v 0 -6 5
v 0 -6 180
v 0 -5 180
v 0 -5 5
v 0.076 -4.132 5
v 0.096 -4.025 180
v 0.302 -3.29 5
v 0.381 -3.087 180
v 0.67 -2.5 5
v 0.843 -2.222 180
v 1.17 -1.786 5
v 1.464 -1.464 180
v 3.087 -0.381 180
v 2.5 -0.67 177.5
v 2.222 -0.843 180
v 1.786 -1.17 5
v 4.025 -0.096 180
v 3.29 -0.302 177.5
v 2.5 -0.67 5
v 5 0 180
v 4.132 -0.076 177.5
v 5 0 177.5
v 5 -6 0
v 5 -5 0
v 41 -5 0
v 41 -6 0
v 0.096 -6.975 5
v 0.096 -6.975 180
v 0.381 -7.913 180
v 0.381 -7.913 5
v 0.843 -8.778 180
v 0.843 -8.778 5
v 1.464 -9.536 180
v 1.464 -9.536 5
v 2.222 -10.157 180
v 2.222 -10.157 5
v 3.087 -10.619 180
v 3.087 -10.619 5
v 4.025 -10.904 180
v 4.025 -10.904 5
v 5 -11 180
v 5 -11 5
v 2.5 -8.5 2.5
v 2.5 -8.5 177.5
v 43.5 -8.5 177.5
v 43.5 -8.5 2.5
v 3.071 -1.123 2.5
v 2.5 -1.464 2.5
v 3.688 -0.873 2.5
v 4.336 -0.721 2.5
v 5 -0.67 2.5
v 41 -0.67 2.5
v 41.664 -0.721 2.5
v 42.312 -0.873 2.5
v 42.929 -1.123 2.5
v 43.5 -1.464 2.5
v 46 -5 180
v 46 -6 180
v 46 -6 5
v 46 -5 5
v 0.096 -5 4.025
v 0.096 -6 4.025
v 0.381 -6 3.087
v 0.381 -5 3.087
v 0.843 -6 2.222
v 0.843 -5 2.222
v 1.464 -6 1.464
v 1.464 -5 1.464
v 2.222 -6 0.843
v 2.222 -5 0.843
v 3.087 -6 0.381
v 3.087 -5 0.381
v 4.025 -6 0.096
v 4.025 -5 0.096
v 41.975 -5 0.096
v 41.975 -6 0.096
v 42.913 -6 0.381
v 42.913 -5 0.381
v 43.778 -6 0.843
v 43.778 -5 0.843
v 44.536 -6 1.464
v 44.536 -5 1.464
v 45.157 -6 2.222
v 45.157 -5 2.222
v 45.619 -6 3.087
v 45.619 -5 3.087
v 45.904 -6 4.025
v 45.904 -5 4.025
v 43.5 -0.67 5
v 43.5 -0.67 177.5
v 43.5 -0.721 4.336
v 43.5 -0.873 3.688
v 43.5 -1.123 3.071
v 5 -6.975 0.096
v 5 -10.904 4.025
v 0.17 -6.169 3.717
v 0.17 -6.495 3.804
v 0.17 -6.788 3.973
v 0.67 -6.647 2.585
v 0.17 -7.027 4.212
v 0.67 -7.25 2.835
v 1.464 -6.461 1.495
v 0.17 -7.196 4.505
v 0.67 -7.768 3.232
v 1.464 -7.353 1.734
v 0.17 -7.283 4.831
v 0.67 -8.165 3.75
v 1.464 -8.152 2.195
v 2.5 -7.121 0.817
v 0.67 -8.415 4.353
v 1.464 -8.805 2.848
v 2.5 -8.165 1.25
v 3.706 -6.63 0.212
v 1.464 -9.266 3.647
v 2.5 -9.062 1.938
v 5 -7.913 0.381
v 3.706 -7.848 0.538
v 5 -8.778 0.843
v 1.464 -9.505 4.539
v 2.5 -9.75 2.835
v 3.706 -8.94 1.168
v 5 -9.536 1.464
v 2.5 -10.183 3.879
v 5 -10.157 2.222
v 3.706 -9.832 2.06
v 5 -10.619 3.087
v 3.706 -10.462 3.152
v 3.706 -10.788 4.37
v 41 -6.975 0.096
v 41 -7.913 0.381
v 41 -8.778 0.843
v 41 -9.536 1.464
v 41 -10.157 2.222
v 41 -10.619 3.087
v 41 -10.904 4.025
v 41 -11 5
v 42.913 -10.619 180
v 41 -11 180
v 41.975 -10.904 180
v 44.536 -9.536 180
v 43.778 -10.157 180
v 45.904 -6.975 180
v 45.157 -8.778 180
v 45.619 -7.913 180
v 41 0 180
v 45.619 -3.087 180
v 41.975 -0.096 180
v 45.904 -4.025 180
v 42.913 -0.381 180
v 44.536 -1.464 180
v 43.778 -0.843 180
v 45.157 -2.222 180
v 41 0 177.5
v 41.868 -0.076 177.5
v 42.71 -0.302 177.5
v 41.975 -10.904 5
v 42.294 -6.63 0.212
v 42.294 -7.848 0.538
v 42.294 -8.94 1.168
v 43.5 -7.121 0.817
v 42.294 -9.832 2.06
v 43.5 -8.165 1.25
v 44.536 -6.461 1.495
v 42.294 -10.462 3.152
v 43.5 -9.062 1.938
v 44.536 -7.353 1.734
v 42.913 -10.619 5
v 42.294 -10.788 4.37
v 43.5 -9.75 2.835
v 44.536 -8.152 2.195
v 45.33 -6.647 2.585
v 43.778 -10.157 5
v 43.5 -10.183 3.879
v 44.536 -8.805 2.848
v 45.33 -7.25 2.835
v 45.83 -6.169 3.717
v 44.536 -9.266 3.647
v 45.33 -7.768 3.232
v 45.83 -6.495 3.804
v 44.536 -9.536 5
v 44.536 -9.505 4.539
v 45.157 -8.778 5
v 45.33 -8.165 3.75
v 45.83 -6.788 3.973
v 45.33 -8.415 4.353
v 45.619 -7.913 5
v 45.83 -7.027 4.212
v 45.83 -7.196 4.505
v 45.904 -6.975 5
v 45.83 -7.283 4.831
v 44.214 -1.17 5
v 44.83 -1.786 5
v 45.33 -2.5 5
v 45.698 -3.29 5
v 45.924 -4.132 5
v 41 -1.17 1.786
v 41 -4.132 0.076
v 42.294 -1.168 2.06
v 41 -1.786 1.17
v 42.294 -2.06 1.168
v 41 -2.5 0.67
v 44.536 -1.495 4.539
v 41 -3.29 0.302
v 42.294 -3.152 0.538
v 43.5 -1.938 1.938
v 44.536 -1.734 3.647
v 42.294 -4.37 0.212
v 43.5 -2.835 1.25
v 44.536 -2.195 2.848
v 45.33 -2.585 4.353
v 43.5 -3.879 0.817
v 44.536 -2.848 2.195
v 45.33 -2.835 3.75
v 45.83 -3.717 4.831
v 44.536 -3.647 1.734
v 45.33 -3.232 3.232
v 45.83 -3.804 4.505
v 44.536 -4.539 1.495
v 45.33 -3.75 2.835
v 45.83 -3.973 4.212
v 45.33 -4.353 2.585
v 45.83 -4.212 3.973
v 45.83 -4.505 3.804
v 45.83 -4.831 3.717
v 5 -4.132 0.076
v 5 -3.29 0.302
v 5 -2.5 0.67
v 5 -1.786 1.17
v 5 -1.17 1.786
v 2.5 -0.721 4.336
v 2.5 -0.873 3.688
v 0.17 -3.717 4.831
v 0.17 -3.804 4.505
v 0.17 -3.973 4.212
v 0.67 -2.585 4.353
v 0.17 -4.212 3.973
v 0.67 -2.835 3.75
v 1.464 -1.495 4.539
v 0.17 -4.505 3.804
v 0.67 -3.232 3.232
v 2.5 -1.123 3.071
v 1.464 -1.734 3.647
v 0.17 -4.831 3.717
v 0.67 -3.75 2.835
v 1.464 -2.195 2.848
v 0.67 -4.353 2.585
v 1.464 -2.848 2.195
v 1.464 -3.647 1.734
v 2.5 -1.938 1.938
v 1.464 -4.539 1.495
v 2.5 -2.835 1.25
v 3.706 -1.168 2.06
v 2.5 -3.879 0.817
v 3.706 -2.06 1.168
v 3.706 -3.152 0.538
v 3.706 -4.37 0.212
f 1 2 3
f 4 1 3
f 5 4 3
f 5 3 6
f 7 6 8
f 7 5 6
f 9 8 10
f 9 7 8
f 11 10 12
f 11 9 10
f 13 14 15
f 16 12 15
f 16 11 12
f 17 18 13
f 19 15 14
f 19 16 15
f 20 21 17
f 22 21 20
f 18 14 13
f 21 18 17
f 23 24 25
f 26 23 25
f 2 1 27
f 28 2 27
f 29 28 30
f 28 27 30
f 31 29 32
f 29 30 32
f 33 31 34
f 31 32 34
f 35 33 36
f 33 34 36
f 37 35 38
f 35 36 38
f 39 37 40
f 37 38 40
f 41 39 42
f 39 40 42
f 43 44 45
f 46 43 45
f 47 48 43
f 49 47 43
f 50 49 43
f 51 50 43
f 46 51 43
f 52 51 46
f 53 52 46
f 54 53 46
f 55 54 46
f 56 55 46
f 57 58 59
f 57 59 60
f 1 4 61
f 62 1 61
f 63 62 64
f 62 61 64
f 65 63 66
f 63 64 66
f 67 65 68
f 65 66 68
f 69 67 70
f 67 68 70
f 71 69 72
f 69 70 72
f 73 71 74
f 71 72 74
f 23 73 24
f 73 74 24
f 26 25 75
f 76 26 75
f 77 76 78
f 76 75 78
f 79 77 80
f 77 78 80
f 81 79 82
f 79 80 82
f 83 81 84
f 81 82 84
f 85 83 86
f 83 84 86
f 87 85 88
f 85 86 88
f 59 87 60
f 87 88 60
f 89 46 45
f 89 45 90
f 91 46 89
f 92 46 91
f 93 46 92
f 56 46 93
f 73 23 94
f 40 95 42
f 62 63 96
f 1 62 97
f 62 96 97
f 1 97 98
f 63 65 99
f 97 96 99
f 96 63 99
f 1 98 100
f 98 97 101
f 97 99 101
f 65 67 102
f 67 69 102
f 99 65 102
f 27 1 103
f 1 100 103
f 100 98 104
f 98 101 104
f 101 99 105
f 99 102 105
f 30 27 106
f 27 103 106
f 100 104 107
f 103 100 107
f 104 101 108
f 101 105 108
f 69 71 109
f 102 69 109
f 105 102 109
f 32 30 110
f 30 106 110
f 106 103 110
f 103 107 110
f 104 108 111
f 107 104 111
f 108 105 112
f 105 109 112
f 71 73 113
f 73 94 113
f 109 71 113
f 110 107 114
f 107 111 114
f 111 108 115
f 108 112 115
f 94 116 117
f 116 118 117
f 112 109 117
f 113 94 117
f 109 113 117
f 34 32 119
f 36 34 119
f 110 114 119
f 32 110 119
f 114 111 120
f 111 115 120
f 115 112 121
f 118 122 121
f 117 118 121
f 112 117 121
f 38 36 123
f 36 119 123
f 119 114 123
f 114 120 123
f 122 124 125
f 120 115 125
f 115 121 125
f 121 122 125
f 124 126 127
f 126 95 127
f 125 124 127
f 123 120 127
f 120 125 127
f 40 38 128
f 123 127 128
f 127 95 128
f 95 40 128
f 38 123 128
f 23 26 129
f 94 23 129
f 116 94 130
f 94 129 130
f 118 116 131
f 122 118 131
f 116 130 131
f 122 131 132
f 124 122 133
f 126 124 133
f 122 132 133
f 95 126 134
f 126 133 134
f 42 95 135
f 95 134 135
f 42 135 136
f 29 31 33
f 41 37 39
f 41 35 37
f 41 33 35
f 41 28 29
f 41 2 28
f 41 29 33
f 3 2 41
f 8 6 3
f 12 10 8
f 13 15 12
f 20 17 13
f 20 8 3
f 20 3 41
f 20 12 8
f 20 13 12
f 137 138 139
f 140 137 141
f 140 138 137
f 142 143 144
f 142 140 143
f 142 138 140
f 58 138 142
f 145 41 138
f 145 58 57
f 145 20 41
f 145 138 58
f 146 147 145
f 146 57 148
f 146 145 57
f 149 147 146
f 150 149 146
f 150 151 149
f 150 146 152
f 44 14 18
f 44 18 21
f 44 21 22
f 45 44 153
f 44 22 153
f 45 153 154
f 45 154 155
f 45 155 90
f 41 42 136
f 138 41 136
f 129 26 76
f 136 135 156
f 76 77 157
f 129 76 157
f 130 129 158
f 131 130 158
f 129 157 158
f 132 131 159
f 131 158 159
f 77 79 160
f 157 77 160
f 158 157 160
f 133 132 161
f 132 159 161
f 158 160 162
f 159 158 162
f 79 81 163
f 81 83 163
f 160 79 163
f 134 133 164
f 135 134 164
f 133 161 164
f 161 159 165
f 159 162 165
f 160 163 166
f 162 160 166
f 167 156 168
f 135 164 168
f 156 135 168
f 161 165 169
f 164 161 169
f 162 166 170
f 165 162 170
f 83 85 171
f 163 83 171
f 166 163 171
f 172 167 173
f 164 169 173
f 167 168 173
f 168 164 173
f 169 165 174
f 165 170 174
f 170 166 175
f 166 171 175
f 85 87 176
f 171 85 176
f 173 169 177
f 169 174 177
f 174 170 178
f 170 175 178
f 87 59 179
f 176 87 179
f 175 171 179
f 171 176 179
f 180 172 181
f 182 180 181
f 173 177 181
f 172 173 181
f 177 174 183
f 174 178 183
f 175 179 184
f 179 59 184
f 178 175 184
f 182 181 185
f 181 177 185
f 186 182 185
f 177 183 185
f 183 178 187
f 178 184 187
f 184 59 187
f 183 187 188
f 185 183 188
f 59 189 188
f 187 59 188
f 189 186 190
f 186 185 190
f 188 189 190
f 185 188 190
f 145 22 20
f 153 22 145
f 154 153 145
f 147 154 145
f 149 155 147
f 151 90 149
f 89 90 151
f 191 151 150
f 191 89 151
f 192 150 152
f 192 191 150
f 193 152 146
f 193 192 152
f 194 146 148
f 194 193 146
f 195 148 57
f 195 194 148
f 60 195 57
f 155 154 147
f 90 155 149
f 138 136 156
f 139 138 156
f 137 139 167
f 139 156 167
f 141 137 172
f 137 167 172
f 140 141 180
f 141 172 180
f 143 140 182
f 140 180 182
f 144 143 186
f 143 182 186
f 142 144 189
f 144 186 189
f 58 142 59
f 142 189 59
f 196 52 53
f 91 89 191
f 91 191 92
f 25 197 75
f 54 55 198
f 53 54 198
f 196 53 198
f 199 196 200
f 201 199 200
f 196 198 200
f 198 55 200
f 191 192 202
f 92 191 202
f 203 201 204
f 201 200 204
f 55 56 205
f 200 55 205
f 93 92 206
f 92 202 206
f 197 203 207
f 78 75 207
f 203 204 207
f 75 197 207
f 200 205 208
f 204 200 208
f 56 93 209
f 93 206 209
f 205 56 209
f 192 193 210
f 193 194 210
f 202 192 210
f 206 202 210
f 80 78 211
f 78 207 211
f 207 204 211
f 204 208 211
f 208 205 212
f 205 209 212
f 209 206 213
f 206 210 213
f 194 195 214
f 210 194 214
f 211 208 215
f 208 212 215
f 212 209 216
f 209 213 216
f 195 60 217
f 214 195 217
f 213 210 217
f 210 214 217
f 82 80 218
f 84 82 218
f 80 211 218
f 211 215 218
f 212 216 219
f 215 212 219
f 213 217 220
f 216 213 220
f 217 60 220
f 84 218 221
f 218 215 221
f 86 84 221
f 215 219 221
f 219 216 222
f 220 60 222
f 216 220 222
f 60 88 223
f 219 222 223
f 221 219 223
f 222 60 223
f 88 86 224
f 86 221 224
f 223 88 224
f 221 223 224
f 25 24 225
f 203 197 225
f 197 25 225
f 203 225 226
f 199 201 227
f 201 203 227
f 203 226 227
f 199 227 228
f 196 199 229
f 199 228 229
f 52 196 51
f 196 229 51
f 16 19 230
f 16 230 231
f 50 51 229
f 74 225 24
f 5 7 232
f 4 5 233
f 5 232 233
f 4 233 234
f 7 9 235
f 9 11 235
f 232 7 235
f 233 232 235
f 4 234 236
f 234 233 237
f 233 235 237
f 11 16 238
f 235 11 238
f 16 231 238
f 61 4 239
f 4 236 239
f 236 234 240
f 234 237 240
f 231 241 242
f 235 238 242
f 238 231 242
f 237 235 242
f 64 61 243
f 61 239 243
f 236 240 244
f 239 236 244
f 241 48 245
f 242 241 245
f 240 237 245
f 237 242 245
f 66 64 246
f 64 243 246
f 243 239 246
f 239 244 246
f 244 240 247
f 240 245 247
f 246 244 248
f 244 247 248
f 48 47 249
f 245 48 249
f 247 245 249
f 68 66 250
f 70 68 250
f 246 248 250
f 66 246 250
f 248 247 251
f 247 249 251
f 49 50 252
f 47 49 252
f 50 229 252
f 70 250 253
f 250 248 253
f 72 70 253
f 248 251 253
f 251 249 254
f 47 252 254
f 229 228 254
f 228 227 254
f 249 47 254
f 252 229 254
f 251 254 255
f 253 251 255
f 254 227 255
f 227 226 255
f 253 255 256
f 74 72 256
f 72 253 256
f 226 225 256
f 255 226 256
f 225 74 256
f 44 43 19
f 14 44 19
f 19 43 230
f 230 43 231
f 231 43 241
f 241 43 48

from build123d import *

# Parameters (mm, degrees)
F0_W         = 46
F0_H         = 11
F1_DEPTH     = 180
F2_T         = -2.5
F3_T1_DEPTH  = 71
F4_R         = 5
F5_T1_DEPTH  = 187.5
F5_T3_DEPTH  = 1
F5_T6_ANGLE  = 90
F5_T8_ANGLE  = 89.9999999974
F5_T10_ANGLE = 90
F5_T12_ANGLE = 89.9999999974


# Not quite as in the source:
# - a fillet or chamfer that OpenCascade refuses, or shapes differently, is made with other operations: its cross-section is extruded or revolved along the edge and cut away or added


with BuildPart() as f1:
    # F0 (on Top) → F1 (new body)
    with BuildSketch(Plane.XY):
        with Locations((23, -5.5)):
            Rectangle(F0_W, F0_H)
    extrude(amount=F1_DEPTH)

    # F2
    f2_openings = [f1.faces().sort_by_distance(p)[0] for p in [
        (23, 0, 90),
    ]]
    offset(amount=F2_T, openings=f2_openings)

    # F3: fillet of radius 5 on 1 edges, made by hand

    # F3_s2 → F3_t1 (cut)
    with BuildSketch(Plane.YZ.offset(-12.5)):
        with BuildLine():
            ThreePointArc((-5, 0), (-1.4644660941, 1.4644660941), (0, 5))
            Line((0, 5), (0, 0))
            Line((0, 0), (-5, 0))
        make_face()
    extrude(amount=F3_T1_DEPTH, mode=Mode.SUBTRACT)

    # F4
    f4_edges = [f1.edges().sort_by_distance(p)[0] for p in [
        (23, -11, 0),
    ]]
    fillet(f4_edges, radius=F4_R)

    # F5: fillet of radius 5 on 2 edges, made by hand

    # F5_s2 → F5_t1 (cut)
    with BuildSketch(Plane.XY.offset(5)):
        with BuildLine():
            ThreePointArc((0, -6), (1.4644660941, -9.5355339059), (5, -11))
            Line((5, -11), (0, -11))
            Line((0, -11), (0, -6))
        make_face()
        with BuildLine():
            ThreePointArc((41, -11), (44.5355339059, -9.5355339059), (46, -6))
            Line((46, -6), (46, -11))
            Line((46, -11), (41, -11))
        make_face()
        with BuildLine():
            ThreePointArc((41, 0), (44.5355339059, -1.4644660941), (46, -5))
            Line((46, -5), (46, 0))
            Line((46, 0), (41, 0))
        make_face()
        with BuildLine():
            ThreePointArc((0, -5), (1.4644660941, -1.4644660941), (5, 0))
            Line((5, 0), (0, 0))
            Line((0, 0), (0, -5))
        make_face()
    extrude(amount=F5_T1_DEPTH, mode=Mode.SUBTRACT)

    # F5_s4 → F5_t3 (cut)
    with BuildSketch(Plane.XZ.offset(5)):
        with BuildLine():
            ThreePointArc((41, 0), (44.5355339059, 1.4644660941), (46, 5))
            Line((46, 5), (46, 0))
            Line((46, 0), (41, 0))
        make_face()
        with BuildLine():
            ThreePointArc((0, 5), (1.4644660941, 1.4644660941), (5, 0))
            Line((5, 0), (0, 0))
            Line((0, 0), (0, 5))
        make_face()
    extrude(amount=F5_T3_DEPTH, mode=Mode.SUBTRACT)

    # F5_s5 → F5_t6 (revolve, cut)
    with BuildSketch(Plane.XZ.offset(6)):
        with BuildLine():
            ThreePointArc((41, 0), (44.5355339059, 1.4644660941), (46, 5))
            Line((46, 5), (46, 0))
            Line((46, 0), (41, 0))
        make_face()
    revolve(axis=Axis((46, -6, 5), (-1, 0, 0)), revolution_arc=F5_T6_ANGLE, mode=Mode.SUBTRACT)

    # F5_s7 → F5_t8 (revolve, cut)
    with BuildSketch(Plane.XY.offset(5.0000000001)):
        with BuildLine():
            ThreePointArc((41, 0), (44.5355339059, -1.4644660941), (46, -5))
            Line((46, -5), (46, 0))
            Line((46, 0), (41, 0))
        make_face()
    revolve(axis=Axis((46, -5.0000000001, 5.0000000001), (-1, 0, 0)), revolution_arc=F5_T8_ANGLE, mode=Mode.SUBTRACT)

    # F5_s9 → F5_t10 (revolve, cut)
    with BuildSketch(Plane.XZ.offset(6)):
        with BuildLine():
            ThreePointArc((0, 5), (1.4644660941, 1.4644660941), (5, 0))
            Line((5, 0), (0, 0))
            Line((0, 0), (0, 5))
        make_face()
    revolve(axis=Axis((0, -6, 5), (-1, 0, 0)), revolution_arc=F5_T10_ANGLE, mode=Mode.SUBTRACT)

    # F5_s11 → F5_t12 (revolve, cut)
    with BuildSketch(Plane.XY.offset(5.0000000001)):
        with BuildLine():
            ThreePointArc((0, -5), (1.4644660941, -1.4644660941), (5, 0))
            Line((5, 0), (0, 0))
            Line((0, 0), (0, -5))
        make_face()
    revolve(axis=Axis((0, -5.0000000001, 5.0000000001), (-1, 0, 0)), revolution_arc=F5_T12_ANGLE, mode=Mode.SUBTRACT)


solid = f1.part
